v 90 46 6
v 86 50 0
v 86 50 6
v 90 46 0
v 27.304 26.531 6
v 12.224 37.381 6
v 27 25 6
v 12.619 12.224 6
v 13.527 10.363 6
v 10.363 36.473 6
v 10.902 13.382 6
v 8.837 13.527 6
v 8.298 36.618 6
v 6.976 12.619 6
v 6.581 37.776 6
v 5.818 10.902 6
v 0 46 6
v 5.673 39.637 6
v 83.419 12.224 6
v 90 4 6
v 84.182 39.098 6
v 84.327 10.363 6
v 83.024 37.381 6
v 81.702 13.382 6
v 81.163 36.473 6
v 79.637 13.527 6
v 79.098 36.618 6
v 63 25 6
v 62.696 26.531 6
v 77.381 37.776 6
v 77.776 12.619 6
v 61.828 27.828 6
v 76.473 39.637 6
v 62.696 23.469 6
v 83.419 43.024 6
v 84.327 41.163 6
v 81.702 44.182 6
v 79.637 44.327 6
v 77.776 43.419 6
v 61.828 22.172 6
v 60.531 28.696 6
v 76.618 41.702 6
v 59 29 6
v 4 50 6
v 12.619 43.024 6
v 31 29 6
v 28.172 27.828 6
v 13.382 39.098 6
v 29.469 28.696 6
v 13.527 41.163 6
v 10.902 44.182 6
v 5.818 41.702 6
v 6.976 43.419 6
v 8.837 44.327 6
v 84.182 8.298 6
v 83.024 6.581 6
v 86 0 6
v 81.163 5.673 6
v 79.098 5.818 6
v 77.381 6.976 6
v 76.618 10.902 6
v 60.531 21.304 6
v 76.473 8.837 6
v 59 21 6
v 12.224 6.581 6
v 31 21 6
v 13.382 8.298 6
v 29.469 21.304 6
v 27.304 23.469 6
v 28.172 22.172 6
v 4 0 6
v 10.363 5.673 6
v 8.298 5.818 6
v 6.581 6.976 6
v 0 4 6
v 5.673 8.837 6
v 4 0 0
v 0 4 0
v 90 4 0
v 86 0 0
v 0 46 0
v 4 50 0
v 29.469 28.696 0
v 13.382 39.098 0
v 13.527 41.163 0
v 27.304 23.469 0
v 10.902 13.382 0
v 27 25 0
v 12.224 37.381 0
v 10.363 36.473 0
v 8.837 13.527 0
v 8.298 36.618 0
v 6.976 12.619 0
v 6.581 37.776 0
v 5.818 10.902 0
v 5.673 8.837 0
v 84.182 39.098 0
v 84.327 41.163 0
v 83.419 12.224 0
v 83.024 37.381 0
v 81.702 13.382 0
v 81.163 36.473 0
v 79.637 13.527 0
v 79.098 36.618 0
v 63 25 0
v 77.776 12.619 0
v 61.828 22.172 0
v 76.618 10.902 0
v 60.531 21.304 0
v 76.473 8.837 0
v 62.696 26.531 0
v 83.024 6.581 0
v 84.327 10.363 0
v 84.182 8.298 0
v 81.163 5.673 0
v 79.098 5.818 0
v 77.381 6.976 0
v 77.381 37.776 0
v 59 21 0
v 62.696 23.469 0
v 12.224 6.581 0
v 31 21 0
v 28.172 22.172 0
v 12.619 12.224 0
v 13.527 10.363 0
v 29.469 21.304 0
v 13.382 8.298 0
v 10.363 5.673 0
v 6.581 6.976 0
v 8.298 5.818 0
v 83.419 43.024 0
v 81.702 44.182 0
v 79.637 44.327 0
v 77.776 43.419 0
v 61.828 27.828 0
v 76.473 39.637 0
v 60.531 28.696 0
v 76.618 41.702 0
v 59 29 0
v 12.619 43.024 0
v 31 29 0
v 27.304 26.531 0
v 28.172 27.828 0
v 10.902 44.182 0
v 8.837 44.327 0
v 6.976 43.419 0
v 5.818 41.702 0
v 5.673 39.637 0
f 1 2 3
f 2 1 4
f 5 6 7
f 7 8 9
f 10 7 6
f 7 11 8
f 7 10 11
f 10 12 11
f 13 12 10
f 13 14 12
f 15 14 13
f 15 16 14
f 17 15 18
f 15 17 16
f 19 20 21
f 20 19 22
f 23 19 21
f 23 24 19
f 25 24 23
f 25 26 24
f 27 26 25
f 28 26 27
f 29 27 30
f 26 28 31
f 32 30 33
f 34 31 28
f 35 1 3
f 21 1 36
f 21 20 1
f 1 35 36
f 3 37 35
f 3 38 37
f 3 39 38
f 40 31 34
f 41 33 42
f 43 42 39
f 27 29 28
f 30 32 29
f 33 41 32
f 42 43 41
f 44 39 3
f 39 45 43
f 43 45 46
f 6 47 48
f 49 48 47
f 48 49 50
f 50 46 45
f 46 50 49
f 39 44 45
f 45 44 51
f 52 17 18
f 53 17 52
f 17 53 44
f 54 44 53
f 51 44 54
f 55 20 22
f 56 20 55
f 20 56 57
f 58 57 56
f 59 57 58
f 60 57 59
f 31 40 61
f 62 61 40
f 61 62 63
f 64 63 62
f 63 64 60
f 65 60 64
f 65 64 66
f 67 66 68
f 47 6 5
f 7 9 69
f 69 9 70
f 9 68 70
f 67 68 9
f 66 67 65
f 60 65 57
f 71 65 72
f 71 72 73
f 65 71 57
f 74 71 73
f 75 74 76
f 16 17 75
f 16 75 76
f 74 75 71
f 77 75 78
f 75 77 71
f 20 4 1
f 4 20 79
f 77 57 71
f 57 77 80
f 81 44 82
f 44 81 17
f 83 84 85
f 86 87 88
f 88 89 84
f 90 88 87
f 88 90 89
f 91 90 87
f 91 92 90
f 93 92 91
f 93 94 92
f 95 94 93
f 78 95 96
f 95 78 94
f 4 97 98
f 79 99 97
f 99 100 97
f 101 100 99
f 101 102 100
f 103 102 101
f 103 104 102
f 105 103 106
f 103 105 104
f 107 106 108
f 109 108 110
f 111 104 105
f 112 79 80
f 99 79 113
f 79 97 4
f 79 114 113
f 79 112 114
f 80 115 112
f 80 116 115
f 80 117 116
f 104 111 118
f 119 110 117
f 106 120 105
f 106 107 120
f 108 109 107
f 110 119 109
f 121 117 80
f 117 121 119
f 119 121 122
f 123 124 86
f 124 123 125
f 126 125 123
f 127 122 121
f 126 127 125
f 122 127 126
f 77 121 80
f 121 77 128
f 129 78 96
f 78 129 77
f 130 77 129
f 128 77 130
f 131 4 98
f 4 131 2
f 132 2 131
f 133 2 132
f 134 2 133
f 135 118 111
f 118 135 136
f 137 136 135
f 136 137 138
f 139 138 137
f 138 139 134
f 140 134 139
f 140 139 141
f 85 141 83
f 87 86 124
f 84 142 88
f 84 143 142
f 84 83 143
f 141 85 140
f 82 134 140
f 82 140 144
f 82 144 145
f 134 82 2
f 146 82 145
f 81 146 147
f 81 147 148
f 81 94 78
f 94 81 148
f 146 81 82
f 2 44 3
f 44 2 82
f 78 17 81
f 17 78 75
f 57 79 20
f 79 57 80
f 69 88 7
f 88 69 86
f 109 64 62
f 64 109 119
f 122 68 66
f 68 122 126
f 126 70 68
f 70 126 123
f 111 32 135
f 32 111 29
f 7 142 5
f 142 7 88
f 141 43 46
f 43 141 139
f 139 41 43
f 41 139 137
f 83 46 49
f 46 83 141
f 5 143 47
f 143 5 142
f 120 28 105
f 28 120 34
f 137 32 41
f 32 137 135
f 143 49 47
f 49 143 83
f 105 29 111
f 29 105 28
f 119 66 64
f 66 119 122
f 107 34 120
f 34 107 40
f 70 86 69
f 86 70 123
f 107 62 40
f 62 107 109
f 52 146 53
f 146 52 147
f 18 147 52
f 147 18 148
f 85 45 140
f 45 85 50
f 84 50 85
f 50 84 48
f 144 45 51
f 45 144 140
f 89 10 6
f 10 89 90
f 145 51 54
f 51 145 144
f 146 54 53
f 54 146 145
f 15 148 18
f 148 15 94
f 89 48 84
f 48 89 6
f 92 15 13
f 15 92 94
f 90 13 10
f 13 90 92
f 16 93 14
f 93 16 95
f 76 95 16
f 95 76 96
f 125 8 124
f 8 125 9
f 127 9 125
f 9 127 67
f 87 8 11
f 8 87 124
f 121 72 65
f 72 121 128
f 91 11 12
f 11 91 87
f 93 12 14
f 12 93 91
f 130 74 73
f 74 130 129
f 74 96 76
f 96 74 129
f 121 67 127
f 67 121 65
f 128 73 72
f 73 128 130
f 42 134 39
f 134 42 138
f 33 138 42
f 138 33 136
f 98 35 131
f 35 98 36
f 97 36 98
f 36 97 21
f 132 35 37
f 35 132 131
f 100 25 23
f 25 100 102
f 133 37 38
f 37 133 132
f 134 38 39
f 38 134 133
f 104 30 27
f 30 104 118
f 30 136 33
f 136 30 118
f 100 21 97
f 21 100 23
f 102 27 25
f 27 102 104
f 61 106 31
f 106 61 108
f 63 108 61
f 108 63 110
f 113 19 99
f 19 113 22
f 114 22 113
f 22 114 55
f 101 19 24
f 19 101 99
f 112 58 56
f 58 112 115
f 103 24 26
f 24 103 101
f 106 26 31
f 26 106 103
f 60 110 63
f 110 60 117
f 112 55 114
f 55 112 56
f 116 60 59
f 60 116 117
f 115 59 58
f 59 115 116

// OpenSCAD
$fn = 32;

// ----------------------------------------------------------------------
// Bracket plate: slot plate 90 x 50
// ----------------------------------------------------------------------

// --- parameters (mm) ---
hole_r = 4;               // bolt hole radius
plate_t = 6;              // plate thickness, Z (extrusion height)
plate_l = 90;             // plate length
plate_w = 50;             // plate width
slot_l = 28;              // slot straight length
slot_r = 4;               // slot end radius

slot_len = slot_l + 2 * slot_r;
slot_w = 2 * slot_r;
hole_d2 = 2 * hole_r;

profile = [[4, 0], [86, 0], [90, 4], [90, 46], [86, 50], [4, 50], [0, 46], [0, 4]];  // primary outline, 8 points, counter clockwise
void_1 = [[59, 21], [60.531, 21.304], [61.828, 22.172], [62.696, 23.469], [63, 25], [62.696, 26.531], [61.828, 27.828], [60.531, 28.696], [59, 29], [31, 29], [29.469, 28.696], [28.172, 27.828], [27.304, 26.531], [27, 25], [27.304, 23.469], [28.172, 22.172], [29.469, 21.304], [31, 21]];  // grip slot, 18 points
void_2 = [[13.527, 41.163], [12.619, 43.024], [10.902, 44.182], [8.837, 44.327], [6.976, 43.419], [5.818, 41.702], [5.673, 39.637], [6.581, 37.776], [8.298, 36.618], [10.363, 36.473], [12.224, 37.381], [13.382, 39.098]];  // corner hole, 12 points
void_3 = [[13.527, 10.363], [12.619, 12.224], [10.902, 13.382], [8.837, 13.527], [6.976, 12.619], [5.818, 10.902], [5.673, 8.837], [6.581, 6.976], [8.298, 5.818], [10.363, 5.673], [12.224, 6.581], [13.382, 8.298]];  // corner hole, 12 points
void_4 = [[84.327, 41.163], [83.419, 43.024], [81.702, 44.182], [79.637, 44.327], [77.776, 43.419], [76.618, 41.702], [76.473, 39.637], [77.381, 37.776], [79.098, 36.618], [81.163, 36.473], [83.024, 37.381], [84.182, 39.098]];  // corner hole, 12 points
void_5 = [[84.327, 10.363], [83.419, 12.224], [81.702, 13.382], [79.637, 13.527], [77.776, 12.619], [76.618, 10.902], [76.473, 8.837], [77.381, 6.976], [79.098, 5.818], [81.163, 5.673], [83.024, 6.581], [84.182, 8.298]];  // corner hole, 12 points

// --- the one profile operation ---
difference() {
  linear_extrude(height = plate_t) polygon(points = profile);
  translate([0, 0, -1])
    linear_extrude(height = plate_t + 2) polygon(points = void_1);
  translate([0, 0, -1])
    linear_extrude(height = plate_t + 2) polygon(points = void_2);
  translate([0, 0, -1])
    linear_extrude(height = plate_t + 2) polygon(points = void_3);
  translate([0, 0, -1])
    linear_extrude(height = plate_t + 2) polygon(points = void_4);
  translate([0, 0, -1])
    linear_extrude(height = plate_t + 2) polygon(points = void_5);
}
